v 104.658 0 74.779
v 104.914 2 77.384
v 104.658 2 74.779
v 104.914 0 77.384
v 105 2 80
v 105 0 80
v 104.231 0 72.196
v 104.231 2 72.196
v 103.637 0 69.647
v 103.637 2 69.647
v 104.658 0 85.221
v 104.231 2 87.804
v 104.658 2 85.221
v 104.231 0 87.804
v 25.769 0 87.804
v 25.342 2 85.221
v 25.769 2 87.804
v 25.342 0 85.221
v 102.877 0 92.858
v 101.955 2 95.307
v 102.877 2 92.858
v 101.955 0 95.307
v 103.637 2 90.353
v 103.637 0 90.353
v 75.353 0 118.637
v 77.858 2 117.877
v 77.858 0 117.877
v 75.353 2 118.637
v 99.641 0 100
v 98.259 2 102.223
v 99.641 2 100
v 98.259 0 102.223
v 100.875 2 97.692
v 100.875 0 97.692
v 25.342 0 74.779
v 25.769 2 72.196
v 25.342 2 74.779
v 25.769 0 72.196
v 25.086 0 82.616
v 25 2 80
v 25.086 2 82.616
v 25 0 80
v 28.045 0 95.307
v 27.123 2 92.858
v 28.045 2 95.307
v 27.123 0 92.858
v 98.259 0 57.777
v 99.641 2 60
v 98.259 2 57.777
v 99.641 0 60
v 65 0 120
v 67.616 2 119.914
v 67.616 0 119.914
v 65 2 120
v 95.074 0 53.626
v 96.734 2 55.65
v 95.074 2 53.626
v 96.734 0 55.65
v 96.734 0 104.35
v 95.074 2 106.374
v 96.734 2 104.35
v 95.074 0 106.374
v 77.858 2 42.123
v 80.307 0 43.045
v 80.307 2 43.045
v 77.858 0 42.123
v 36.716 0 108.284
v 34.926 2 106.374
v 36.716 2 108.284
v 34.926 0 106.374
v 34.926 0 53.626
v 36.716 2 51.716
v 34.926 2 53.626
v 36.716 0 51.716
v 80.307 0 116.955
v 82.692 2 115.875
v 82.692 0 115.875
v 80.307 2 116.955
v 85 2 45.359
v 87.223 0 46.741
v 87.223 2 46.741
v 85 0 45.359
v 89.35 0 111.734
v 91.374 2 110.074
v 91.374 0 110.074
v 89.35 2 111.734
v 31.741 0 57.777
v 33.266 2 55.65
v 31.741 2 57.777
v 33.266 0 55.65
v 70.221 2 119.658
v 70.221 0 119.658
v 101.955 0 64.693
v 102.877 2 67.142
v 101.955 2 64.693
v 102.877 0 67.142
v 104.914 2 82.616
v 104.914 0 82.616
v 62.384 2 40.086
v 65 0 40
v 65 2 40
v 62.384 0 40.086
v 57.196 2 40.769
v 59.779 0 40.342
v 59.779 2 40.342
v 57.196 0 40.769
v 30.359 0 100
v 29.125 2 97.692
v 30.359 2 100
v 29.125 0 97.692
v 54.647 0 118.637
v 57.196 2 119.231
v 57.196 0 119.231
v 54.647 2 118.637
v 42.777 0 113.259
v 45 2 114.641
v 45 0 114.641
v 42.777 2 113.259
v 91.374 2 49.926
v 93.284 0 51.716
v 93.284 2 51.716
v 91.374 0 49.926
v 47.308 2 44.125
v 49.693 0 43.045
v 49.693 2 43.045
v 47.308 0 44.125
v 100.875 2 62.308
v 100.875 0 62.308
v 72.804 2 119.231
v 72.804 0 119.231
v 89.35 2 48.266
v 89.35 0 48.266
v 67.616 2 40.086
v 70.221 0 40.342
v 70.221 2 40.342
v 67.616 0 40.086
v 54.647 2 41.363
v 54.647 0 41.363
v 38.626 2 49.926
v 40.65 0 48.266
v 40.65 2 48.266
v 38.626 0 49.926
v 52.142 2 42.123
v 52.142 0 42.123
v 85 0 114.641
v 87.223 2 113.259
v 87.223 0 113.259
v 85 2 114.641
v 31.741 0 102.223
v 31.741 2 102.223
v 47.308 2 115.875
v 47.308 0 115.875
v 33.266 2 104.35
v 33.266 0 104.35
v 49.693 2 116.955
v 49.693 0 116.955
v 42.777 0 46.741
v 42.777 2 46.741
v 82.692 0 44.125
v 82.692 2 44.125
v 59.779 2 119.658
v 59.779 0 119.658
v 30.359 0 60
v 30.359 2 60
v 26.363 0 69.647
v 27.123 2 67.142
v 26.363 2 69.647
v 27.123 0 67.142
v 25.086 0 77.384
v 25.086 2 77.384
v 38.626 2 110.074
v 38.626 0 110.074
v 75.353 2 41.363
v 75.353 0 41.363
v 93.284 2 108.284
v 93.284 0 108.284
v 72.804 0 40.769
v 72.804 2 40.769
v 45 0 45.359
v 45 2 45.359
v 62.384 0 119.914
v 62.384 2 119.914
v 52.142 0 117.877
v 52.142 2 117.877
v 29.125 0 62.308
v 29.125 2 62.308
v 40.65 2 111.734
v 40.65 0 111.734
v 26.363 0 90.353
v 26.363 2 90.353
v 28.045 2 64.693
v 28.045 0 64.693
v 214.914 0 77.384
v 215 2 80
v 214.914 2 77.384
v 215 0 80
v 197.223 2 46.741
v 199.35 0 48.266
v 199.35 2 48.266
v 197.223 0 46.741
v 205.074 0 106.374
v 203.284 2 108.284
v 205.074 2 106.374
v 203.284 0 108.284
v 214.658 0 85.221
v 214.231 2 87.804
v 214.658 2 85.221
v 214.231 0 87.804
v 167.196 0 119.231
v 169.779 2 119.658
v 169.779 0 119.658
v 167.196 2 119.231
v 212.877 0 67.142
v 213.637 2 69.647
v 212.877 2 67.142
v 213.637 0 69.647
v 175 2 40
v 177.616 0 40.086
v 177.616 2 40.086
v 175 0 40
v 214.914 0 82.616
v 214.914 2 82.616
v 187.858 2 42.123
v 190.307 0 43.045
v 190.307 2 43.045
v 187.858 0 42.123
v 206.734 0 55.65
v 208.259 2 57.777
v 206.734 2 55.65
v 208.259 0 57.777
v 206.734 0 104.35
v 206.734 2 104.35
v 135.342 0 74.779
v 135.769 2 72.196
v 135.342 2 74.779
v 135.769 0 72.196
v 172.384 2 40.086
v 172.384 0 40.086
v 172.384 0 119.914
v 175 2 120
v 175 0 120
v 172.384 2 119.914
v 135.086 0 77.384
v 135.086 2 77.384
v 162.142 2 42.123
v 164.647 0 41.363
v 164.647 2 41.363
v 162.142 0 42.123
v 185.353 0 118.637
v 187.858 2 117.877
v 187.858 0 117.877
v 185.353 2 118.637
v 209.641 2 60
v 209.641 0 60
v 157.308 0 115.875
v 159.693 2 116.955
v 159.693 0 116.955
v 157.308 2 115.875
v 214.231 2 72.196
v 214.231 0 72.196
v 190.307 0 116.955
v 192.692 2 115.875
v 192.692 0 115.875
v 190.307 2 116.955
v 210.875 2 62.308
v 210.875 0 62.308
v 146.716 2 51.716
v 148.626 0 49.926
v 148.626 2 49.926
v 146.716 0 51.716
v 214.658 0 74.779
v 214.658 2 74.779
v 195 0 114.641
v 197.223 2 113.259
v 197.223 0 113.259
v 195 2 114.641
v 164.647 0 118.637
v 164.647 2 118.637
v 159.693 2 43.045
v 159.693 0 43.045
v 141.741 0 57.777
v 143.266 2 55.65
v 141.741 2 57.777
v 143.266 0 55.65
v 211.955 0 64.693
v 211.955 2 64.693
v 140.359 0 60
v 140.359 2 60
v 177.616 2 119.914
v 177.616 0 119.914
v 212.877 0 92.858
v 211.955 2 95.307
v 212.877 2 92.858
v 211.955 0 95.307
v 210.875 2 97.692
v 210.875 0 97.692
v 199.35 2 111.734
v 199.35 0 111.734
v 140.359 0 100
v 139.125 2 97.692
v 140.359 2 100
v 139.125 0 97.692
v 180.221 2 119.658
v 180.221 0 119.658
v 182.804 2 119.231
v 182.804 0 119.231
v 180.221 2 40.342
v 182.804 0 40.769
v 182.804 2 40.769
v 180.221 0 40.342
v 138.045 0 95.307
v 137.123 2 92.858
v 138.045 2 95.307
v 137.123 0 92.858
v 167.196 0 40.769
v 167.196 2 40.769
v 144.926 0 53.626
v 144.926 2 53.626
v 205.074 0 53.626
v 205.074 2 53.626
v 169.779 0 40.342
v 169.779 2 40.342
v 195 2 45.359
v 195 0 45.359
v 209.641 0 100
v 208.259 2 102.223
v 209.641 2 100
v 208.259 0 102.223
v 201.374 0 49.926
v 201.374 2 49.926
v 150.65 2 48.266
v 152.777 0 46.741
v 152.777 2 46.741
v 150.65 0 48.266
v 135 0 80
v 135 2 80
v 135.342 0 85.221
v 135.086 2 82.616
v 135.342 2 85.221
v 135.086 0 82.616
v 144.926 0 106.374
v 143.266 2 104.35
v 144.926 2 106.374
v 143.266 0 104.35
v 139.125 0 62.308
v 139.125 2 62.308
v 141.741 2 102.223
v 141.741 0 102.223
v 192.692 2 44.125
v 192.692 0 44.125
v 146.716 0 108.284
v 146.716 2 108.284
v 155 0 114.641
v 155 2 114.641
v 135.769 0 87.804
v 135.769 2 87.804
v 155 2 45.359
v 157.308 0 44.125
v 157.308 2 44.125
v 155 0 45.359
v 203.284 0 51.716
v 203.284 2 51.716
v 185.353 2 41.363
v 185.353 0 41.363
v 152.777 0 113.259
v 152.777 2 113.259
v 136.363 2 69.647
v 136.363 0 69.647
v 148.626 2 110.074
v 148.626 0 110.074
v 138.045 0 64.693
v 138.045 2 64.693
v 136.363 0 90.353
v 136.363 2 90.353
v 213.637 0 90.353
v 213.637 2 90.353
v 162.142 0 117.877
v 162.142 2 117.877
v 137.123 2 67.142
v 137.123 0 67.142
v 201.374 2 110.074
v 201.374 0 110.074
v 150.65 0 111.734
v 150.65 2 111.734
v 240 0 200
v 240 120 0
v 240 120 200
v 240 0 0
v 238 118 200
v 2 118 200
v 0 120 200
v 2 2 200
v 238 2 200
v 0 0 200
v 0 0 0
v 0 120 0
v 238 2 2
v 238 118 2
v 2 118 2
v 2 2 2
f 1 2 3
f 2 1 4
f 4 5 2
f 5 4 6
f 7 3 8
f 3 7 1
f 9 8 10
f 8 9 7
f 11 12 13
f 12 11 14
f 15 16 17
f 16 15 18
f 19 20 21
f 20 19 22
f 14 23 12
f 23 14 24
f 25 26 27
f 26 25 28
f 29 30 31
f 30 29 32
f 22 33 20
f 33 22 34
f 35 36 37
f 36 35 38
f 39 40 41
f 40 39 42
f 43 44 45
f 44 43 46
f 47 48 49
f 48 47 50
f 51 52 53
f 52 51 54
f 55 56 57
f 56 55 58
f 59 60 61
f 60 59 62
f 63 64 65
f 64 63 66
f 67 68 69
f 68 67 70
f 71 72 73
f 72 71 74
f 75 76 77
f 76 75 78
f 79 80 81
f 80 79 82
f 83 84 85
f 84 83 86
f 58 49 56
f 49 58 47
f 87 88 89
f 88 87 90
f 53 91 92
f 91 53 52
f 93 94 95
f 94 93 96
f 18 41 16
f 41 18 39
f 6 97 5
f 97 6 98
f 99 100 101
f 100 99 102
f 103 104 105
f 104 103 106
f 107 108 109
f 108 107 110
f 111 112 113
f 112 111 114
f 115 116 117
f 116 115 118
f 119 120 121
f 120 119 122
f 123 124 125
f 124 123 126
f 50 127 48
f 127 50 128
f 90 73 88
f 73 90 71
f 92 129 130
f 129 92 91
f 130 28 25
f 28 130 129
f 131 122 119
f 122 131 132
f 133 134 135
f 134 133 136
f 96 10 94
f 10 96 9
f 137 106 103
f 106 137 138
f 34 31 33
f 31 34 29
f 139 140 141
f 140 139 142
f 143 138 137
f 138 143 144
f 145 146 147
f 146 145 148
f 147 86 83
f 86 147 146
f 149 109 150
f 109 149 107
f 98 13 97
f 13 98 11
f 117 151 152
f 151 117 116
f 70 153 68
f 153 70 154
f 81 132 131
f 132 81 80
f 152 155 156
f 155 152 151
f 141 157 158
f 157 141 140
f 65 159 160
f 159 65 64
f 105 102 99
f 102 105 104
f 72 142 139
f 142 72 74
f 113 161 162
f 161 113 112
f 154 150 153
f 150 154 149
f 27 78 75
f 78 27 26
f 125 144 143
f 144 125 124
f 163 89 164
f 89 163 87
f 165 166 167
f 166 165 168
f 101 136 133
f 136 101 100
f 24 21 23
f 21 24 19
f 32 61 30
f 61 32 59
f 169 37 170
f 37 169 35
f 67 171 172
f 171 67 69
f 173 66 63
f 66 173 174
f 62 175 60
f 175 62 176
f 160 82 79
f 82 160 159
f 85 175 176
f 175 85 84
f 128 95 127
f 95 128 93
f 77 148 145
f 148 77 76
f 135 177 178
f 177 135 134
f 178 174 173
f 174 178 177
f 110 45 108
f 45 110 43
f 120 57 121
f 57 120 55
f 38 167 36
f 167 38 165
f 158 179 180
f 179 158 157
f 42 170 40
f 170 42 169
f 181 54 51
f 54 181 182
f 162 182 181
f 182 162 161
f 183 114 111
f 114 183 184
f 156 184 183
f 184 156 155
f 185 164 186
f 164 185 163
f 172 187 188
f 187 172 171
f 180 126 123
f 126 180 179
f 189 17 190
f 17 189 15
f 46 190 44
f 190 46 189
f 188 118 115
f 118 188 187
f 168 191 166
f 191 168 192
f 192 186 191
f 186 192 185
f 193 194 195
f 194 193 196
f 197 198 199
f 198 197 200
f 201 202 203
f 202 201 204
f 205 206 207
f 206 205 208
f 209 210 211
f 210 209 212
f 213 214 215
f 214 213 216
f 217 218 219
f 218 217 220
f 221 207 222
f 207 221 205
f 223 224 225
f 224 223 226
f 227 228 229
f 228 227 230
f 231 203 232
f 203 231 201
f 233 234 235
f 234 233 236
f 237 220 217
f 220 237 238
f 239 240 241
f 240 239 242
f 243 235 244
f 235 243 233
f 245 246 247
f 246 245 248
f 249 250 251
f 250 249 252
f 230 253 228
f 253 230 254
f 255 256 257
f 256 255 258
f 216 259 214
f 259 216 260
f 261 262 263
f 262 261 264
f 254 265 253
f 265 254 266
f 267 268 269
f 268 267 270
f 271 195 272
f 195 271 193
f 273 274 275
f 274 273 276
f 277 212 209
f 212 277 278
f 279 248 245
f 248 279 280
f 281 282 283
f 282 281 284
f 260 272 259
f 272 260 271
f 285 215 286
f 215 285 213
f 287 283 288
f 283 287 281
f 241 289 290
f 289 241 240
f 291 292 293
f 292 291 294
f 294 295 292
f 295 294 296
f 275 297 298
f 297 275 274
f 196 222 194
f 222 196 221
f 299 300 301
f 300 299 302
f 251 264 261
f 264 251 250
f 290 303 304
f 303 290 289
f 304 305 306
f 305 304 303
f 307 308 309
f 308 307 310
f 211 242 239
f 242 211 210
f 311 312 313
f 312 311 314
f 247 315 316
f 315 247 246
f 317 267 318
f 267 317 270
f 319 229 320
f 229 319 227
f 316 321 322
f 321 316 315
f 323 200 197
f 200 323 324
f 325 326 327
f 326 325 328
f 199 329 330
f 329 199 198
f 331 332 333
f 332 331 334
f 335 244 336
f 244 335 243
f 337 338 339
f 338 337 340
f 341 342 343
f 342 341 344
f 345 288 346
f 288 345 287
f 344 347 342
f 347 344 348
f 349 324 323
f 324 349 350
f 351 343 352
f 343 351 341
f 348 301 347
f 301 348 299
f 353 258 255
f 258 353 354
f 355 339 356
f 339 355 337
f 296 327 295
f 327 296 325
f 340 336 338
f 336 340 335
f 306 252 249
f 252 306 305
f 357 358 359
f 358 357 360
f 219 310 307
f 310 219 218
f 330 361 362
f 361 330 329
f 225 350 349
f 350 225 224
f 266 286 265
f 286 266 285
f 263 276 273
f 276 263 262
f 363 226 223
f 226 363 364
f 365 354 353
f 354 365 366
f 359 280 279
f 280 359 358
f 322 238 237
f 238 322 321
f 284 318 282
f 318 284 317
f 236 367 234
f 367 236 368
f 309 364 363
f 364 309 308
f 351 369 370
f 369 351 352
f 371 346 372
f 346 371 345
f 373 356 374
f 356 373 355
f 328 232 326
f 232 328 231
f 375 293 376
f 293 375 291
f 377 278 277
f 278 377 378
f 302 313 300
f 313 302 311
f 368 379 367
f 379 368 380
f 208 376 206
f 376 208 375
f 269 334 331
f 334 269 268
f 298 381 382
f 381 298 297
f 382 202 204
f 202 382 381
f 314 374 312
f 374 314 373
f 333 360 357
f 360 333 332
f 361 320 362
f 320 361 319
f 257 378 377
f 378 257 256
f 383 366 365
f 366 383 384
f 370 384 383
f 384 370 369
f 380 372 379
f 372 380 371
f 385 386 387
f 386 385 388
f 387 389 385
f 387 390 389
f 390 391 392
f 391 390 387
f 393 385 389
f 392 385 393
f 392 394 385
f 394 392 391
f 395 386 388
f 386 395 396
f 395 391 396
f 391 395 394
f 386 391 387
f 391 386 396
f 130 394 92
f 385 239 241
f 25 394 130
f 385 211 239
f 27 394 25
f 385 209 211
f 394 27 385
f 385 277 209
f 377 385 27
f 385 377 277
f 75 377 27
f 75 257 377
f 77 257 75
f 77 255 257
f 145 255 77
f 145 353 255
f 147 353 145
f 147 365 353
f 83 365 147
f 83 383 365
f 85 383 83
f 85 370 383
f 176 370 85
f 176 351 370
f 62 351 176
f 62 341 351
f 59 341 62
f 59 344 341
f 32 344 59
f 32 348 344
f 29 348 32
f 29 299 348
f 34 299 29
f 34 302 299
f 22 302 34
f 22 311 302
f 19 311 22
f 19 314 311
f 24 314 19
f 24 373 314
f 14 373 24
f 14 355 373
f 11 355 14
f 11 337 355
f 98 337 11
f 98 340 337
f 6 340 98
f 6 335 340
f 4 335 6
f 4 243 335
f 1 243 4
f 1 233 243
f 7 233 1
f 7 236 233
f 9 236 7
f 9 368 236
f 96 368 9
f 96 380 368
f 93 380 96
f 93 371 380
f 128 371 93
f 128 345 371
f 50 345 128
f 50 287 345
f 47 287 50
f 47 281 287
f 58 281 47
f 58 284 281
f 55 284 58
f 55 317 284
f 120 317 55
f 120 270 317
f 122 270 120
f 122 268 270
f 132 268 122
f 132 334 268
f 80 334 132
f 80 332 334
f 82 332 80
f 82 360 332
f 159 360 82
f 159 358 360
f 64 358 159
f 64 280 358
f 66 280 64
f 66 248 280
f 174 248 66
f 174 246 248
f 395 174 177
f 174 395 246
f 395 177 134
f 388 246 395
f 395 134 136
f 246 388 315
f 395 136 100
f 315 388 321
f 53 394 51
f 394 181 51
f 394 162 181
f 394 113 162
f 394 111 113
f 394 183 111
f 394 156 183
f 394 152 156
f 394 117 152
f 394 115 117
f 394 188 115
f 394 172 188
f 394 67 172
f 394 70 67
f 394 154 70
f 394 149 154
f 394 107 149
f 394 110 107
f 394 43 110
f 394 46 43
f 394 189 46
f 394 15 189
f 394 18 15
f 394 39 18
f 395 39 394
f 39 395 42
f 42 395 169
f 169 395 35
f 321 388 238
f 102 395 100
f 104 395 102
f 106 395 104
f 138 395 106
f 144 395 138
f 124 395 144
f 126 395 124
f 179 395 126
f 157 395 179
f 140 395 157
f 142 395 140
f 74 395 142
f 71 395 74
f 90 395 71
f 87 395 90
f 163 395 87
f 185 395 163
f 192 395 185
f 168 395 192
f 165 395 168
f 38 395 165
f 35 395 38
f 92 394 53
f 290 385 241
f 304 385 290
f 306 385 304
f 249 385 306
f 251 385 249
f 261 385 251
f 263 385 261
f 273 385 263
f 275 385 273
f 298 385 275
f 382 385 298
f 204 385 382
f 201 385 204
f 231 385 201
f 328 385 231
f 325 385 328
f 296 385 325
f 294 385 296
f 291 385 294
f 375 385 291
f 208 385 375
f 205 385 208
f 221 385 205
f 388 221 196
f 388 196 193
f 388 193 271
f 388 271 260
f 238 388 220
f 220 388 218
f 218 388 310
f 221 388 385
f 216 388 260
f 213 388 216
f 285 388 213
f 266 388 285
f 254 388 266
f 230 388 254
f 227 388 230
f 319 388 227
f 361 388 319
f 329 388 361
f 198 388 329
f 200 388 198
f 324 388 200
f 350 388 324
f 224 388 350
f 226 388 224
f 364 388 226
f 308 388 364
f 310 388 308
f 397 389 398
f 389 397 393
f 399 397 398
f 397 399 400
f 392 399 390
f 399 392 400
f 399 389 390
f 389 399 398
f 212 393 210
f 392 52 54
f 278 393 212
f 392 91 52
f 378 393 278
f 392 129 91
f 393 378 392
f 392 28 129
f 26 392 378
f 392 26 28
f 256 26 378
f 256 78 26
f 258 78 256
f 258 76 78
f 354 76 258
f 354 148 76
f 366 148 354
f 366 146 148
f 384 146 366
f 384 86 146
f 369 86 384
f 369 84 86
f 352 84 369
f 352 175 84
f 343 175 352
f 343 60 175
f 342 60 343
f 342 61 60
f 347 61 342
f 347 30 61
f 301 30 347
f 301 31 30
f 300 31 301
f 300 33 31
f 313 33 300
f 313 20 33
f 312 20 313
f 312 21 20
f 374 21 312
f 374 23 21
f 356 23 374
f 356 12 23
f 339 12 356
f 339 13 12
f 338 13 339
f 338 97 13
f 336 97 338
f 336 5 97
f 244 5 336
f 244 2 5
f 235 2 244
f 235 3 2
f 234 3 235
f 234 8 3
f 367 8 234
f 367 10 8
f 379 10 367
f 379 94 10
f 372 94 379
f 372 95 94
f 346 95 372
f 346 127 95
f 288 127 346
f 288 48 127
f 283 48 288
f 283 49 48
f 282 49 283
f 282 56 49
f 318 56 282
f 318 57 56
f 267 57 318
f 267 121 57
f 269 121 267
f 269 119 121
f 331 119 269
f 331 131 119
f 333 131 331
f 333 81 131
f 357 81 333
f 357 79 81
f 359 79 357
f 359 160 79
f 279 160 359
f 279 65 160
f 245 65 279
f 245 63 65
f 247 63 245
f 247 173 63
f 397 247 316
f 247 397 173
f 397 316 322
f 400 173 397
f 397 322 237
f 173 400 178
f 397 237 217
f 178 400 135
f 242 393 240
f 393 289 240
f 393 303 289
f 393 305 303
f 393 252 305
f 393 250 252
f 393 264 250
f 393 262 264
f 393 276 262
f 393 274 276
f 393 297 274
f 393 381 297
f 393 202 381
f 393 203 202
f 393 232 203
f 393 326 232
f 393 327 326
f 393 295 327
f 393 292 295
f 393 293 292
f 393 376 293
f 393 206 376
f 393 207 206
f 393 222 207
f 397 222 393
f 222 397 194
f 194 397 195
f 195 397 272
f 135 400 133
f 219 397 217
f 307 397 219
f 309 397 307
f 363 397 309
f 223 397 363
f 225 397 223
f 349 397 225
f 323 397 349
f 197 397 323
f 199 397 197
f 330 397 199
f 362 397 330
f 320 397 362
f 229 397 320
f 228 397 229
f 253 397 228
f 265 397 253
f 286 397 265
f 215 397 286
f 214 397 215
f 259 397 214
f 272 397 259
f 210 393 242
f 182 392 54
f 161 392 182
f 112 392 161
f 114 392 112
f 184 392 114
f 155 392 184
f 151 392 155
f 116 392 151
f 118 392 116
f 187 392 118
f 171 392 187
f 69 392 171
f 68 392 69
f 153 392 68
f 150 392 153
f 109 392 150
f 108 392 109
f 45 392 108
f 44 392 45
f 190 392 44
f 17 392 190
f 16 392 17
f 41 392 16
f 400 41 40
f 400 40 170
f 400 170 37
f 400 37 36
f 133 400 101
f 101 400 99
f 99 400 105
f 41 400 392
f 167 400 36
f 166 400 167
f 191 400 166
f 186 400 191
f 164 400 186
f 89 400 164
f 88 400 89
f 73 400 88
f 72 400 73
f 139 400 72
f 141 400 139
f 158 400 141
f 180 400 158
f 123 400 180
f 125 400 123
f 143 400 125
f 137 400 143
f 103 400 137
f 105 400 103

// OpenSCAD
// Simple chicken feeder - revised
// Body: 240 x 120 x 200 mm
// Wall thickness: 2 mm
// Bottom thickness: 2 mm
// Two front holes: 80 mm diameter
// Intended with 30 mm attachable legs:
//   hole top ~150 mm above ground
//   hole center on body = 80 mm above feeder bottom
//   ground height = 30 + 80 + 40 = 150 mm
// Separate lid.

part = "body"; // "body" or "lid"

body_w = 240;
body_d = 120;
body_h = 200;

wall = 2;
bottom = 2;

hole_d = 80;
hole_center_z = 80;      // from feeder bottom
hole_spacing = 110;      // center-to-center

lid_clearance = 0.6;
lid_h = 14;
lid_wall = 2;

$fn = 96;

module feeder_body() {
    difference() {
        // Outer body
        cube([body_w, body_d, body_h], center=false);

        // Hollow interior; keep 2 mm walls and 2 mm floor; open top
        translate([wall, wall, bottom])
            cube([
                body_w - 2*wall,
                body_d - 2*wall,
                body_h - bottom + 0.1
            ], center=false);

        // Two front openings, 80 mm diameter
        for (x = [
            body_w/2 - hole_spacing/2,
            body_w/2 + hole_spacing/2
        ]) {
            translate([x, -0.1, hole_center_z])
                rotate([-90, 0, 0])
                    cylinder(h=wall + 0.2, d=hole_d);
        }
    }
}

module feeder_lid() {
    inner_w = body_w + lid_clearance;
    inner_d = body_d + lid_clearance;
    outer_w = inner_w + 2*lid_wall;
    outer_d = inner_d + 2*lid_wall;

    difference() {
        cube([outer_w, outer_d, lid_h], center=false);

        // Hollow underside, leaving 2 mm lid top
        translate([lid_wall, lid_wall, lid_wall])
            cube([inner_w, inner_d, lid_h], center=false);
    }
}

if (part == "body")
    feeder_body();
else if (part == "lid")
    feeder_lid();
